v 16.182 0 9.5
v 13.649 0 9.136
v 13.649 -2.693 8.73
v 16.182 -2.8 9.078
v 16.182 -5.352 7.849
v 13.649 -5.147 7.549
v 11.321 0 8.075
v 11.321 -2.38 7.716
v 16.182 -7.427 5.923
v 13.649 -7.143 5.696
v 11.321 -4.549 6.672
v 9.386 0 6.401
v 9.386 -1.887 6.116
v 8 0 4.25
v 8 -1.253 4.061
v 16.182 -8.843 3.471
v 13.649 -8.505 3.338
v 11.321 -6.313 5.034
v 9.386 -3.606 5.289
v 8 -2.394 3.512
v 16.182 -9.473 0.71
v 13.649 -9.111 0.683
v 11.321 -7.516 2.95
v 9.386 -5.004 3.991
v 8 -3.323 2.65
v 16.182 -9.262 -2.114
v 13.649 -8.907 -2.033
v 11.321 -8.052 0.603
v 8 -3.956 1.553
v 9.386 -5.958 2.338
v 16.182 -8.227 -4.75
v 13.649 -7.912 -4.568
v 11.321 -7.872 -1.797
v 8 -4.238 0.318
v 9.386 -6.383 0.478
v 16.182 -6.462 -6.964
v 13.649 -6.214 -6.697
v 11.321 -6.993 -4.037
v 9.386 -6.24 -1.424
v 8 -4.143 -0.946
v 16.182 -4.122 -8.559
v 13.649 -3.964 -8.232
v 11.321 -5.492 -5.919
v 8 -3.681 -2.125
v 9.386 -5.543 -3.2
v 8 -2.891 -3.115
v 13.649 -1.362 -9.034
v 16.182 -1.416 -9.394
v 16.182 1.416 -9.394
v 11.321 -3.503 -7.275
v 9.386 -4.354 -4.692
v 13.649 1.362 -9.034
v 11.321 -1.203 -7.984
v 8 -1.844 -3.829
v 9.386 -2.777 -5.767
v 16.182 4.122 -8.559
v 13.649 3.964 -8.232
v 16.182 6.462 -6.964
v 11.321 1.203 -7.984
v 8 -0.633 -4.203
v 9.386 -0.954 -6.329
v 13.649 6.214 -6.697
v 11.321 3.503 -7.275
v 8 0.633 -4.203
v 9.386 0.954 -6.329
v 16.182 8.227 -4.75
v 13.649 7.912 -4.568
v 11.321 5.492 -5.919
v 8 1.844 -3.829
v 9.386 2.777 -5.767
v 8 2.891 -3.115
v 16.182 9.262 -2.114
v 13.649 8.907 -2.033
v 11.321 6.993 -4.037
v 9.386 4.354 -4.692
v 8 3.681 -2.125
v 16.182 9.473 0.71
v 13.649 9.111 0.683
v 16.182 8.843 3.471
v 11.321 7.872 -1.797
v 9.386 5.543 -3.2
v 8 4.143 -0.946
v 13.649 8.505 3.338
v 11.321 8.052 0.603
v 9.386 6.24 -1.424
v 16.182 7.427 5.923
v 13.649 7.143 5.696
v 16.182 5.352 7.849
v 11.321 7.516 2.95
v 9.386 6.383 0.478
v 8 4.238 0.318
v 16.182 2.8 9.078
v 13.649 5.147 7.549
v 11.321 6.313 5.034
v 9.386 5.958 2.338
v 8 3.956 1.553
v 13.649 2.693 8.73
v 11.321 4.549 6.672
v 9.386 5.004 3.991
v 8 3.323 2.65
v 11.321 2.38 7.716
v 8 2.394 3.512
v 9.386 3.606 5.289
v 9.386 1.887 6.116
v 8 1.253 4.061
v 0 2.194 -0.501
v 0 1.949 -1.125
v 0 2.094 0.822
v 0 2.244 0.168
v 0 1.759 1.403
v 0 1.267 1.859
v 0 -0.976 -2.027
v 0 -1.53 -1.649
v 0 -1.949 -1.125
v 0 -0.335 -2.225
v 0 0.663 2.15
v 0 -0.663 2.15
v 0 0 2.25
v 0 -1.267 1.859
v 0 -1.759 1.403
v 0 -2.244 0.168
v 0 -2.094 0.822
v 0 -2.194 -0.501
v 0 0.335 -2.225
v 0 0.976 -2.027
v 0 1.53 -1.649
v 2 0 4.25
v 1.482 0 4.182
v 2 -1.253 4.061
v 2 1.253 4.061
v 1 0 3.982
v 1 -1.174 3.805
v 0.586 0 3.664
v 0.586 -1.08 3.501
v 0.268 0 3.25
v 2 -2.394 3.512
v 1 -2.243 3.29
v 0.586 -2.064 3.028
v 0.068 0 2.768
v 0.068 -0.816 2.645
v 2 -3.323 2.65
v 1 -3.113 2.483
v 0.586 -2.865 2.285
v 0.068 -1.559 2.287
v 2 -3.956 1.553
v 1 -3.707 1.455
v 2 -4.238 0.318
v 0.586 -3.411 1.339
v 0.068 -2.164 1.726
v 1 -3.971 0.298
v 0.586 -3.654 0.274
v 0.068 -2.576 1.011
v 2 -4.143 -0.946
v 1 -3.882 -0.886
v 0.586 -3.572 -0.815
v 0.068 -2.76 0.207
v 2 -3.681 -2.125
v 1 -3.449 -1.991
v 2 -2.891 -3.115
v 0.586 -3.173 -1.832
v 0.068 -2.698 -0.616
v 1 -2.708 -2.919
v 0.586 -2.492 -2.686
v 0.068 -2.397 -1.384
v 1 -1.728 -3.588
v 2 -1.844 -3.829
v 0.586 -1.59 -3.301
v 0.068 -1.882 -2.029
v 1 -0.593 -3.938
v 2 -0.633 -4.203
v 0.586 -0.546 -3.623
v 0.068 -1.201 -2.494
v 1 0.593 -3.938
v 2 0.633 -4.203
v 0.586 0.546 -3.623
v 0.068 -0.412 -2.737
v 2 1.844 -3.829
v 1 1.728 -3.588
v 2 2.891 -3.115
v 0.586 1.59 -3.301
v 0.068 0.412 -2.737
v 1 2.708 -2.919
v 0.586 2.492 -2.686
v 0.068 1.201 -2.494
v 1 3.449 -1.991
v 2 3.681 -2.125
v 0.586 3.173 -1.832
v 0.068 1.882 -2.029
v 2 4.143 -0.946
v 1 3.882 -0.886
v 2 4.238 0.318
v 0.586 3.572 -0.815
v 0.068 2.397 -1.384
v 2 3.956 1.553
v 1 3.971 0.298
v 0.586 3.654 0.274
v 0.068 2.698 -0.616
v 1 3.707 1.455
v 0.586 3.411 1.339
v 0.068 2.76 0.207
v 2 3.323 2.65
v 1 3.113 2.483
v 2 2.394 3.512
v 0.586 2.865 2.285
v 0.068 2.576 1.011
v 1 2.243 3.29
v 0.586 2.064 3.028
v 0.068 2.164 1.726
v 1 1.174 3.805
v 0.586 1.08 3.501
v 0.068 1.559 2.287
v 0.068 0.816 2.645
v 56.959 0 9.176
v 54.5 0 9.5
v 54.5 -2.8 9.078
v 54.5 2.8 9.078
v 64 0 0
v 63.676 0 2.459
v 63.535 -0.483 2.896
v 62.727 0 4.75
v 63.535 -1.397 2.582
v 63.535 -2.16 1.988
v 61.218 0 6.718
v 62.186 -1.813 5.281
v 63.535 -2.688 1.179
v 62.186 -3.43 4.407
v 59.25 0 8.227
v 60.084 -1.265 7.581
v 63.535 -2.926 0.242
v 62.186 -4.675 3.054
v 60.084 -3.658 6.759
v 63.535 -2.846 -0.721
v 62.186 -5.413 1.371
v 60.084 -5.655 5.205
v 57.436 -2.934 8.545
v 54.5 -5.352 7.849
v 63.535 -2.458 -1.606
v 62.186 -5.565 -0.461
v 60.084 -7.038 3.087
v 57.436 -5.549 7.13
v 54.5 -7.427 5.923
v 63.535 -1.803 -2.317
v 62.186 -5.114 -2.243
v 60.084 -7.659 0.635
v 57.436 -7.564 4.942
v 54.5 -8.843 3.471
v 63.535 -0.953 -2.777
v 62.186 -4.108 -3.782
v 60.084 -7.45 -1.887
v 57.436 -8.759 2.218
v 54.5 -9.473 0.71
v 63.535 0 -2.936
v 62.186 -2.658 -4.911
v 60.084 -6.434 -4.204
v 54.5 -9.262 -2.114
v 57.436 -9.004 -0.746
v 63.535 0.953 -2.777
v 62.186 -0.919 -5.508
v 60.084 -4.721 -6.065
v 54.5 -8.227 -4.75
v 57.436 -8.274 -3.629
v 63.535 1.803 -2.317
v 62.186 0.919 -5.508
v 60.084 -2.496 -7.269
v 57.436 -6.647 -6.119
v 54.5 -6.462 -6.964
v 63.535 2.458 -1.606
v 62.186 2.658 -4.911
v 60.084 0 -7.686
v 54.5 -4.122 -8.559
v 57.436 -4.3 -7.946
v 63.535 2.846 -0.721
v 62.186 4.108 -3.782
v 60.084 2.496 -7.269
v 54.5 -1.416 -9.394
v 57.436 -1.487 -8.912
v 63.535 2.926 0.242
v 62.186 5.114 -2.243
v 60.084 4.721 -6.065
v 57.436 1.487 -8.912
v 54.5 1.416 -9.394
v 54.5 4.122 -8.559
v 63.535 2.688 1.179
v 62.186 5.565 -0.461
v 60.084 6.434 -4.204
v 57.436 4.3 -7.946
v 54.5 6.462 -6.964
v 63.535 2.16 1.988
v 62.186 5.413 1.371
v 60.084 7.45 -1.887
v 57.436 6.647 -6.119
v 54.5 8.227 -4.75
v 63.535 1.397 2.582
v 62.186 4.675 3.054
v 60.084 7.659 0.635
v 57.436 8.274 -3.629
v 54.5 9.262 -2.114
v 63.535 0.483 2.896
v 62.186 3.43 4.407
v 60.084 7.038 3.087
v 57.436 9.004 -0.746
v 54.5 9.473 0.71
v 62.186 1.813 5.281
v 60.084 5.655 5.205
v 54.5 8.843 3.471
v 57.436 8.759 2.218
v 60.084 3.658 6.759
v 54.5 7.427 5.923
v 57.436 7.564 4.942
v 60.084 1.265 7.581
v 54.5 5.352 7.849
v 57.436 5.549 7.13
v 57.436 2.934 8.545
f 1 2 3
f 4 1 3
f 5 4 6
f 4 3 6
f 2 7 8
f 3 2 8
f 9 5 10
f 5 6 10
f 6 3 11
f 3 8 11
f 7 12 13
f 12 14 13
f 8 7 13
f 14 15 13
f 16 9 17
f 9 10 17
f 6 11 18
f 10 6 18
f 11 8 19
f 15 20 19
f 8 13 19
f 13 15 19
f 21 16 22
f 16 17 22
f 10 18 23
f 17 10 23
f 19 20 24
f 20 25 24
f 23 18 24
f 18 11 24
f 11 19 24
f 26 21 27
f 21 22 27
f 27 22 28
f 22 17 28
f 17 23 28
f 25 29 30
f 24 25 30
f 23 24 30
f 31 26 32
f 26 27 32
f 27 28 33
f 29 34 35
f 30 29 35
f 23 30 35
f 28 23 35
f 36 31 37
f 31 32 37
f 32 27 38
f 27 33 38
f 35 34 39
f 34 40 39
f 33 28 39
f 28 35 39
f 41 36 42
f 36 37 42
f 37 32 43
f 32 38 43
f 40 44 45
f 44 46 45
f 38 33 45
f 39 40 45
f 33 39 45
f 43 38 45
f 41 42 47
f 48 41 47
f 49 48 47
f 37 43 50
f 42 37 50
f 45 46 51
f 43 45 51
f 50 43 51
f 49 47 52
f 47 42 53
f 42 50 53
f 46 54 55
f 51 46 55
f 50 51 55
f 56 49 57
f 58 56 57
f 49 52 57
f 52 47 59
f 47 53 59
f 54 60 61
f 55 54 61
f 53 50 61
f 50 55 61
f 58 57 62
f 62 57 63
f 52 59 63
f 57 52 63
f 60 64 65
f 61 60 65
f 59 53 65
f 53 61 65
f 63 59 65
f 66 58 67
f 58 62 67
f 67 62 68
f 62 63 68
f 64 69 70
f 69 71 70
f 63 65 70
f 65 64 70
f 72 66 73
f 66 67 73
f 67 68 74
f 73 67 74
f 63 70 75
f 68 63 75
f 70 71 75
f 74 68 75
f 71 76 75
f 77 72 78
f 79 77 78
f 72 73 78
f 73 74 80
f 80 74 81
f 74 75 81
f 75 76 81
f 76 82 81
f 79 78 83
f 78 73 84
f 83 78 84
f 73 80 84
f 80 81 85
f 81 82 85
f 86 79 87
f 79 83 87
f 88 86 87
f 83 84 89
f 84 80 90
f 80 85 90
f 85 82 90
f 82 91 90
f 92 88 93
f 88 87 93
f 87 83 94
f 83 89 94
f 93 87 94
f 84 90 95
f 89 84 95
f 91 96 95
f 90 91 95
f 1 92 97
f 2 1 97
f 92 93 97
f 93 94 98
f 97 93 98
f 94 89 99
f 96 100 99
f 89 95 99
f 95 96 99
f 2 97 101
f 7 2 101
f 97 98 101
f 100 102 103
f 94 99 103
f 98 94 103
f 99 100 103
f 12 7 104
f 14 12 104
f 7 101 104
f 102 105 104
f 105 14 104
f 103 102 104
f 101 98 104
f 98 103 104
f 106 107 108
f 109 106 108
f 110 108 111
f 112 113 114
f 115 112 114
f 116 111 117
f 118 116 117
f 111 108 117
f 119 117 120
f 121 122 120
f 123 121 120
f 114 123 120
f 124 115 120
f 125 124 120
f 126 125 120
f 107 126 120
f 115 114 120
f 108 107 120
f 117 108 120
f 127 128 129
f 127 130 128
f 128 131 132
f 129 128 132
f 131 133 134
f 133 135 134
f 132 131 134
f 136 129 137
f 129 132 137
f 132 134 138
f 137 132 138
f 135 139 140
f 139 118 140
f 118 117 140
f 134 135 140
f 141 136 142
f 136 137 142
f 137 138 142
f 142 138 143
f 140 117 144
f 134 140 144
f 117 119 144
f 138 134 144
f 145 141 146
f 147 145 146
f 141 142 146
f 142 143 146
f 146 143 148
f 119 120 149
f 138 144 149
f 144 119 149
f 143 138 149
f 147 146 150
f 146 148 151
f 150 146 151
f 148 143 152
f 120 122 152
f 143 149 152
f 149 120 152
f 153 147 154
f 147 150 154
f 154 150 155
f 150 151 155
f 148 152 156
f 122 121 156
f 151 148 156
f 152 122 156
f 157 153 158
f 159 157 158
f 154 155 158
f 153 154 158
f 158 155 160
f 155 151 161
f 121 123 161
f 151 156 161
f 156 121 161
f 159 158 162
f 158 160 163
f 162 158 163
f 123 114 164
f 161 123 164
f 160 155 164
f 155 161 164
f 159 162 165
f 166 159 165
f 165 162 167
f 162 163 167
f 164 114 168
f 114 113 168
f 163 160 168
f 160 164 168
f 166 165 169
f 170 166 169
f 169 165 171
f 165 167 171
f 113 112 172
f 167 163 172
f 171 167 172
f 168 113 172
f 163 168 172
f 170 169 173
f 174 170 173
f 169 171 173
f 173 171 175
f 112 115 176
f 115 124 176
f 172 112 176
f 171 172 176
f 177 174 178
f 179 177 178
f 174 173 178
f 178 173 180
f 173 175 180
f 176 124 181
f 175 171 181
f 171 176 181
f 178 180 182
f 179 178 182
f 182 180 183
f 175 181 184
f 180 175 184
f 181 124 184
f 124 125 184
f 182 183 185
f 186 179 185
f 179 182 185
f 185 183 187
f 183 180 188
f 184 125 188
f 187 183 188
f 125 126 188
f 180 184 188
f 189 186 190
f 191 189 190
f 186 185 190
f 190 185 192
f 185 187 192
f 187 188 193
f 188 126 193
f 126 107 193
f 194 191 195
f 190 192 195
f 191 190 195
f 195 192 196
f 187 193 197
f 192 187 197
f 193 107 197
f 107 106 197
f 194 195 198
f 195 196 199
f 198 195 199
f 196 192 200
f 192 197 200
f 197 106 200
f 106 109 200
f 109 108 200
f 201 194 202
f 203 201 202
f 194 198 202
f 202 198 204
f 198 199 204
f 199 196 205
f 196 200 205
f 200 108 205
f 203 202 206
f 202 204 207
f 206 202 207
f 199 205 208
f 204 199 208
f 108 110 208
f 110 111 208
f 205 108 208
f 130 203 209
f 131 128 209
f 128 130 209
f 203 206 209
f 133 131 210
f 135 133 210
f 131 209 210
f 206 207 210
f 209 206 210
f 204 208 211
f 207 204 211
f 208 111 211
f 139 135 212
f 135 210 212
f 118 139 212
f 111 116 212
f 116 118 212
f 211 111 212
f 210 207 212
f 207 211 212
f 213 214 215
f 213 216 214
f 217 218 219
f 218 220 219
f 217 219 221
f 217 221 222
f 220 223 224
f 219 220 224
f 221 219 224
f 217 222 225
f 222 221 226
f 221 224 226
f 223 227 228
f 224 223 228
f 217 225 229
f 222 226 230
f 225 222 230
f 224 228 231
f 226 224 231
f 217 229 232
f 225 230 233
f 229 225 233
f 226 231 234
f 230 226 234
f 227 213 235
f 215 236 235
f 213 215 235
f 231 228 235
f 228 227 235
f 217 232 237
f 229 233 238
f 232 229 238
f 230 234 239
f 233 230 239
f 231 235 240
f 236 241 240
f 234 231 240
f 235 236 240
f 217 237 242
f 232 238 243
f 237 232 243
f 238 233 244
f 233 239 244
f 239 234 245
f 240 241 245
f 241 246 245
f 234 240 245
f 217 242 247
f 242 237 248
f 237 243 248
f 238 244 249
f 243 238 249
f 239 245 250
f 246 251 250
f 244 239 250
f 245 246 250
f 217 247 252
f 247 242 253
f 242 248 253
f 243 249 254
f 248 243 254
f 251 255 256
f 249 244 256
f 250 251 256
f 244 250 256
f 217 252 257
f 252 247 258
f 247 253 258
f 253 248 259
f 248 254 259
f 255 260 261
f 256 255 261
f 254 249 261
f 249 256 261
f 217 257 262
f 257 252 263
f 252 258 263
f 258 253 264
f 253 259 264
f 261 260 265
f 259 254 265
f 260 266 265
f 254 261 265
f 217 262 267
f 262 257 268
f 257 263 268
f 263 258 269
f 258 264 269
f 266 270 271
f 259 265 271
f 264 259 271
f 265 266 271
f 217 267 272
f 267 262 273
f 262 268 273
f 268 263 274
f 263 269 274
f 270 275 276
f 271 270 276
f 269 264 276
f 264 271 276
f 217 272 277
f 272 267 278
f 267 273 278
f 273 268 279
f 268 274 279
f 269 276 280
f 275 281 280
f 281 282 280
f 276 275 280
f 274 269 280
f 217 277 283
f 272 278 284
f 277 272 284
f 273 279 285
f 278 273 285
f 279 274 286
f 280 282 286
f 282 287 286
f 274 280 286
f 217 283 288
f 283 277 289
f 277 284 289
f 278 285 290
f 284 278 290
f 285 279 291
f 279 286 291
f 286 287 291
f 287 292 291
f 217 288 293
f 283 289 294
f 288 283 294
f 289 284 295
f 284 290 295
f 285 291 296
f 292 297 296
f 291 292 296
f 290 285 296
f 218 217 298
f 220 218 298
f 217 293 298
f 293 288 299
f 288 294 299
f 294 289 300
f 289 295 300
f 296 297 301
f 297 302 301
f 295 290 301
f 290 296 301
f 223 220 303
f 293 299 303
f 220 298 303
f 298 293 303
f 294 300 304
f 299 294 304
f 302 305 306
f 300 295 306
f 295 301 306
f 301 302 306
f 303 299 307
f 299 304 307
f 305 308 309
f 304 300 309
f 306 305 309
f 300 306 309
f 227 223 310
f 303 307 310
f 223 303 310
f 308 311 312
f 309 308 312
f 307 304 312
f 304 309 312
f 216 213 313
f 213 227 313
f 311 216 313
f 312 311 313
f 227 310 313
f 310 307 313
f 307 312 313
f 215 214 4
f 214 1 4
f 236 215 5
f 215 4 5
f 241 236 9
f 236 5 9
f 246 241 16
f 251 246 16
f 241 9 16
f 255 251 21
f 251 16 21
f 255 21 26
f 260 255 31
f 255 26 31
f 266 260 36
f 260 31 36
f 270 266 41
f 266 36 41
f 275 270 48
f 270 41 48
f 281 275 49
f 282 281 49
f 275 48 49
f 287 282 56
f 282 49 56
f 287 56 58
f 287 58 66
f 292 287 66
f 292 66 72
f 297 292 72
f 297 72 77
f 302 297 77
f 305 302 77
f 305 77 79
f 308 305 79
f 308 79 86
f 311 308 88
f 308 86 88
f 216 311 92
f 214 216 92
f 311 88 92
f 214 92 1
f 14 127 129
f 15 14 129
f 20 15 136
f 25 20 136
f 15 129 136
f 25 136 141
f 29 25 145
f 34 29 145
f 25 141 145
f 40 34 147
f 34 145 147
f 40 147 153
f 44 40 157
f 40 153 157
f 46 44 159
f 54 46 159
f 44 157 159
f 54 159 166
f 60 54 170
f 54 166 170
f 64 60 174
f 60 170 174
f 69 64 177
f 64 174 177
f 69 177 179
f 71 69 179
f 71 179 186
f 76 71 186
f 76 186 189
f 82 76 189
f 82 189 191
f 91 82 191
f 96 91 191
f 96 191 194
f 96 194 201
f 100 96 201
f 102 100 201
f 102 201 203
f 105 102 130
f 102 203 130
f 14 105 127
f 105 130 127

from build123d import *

# Parameters (mm, degrees)
F2_R = 9.5
F4_R = 2


# Not quite as in the source:
# - a fillet or chamfer that OpenCascade refuses, or shapes differently, is made with other operations: its cross-section is extruded or revolved along the edge and cut away or added


with BuildPart() as f1:
    # F0 (on Front) → F1 (revolve)
    with BuildSketch(Plane.XZ):
        Polygon((0, 4.25), (0, 0), (64, 0), (64, 9.5), (8, 9.5), (8, 4.25), align=None)
    revolve(axis=Axis((32, 0, 0), (1, 0, 0)))

    # F2
    f2_edges = [f1.edges().sort_by_distance(p)[0] for p in [
        (64, 0, -9.5),
    ]]
    fillet(f2_edges, radius=F2_R)

    # F3: fillet of radius 9 on 1 edges, made by hand

    # F3_s1 → F3_t2 (revolve, cut)
    with BuildSketch(Plane.XZ):
        with BuildLine():
            ThreePointArc((16.181534086, 9.5), (11.3209785622, 8.0746287038), (8, 4.25))
            Line((8, 4.25), (8, 9.5))
            Line((8, 9.5), (16.181534086, 9.5))
        make_face()
    revolve(axis=Axis((8, 0, 0), (1, 0, 0)), mode=Mode.SUBTRACT)

    # F4
    f4_edges = [f1.edges().sort_by_distance(p)[0] for p in [
        (0, 0, -4.25),
    ]]
    fillet(f4_edges, radius=F4_R)


solid = f1.part
